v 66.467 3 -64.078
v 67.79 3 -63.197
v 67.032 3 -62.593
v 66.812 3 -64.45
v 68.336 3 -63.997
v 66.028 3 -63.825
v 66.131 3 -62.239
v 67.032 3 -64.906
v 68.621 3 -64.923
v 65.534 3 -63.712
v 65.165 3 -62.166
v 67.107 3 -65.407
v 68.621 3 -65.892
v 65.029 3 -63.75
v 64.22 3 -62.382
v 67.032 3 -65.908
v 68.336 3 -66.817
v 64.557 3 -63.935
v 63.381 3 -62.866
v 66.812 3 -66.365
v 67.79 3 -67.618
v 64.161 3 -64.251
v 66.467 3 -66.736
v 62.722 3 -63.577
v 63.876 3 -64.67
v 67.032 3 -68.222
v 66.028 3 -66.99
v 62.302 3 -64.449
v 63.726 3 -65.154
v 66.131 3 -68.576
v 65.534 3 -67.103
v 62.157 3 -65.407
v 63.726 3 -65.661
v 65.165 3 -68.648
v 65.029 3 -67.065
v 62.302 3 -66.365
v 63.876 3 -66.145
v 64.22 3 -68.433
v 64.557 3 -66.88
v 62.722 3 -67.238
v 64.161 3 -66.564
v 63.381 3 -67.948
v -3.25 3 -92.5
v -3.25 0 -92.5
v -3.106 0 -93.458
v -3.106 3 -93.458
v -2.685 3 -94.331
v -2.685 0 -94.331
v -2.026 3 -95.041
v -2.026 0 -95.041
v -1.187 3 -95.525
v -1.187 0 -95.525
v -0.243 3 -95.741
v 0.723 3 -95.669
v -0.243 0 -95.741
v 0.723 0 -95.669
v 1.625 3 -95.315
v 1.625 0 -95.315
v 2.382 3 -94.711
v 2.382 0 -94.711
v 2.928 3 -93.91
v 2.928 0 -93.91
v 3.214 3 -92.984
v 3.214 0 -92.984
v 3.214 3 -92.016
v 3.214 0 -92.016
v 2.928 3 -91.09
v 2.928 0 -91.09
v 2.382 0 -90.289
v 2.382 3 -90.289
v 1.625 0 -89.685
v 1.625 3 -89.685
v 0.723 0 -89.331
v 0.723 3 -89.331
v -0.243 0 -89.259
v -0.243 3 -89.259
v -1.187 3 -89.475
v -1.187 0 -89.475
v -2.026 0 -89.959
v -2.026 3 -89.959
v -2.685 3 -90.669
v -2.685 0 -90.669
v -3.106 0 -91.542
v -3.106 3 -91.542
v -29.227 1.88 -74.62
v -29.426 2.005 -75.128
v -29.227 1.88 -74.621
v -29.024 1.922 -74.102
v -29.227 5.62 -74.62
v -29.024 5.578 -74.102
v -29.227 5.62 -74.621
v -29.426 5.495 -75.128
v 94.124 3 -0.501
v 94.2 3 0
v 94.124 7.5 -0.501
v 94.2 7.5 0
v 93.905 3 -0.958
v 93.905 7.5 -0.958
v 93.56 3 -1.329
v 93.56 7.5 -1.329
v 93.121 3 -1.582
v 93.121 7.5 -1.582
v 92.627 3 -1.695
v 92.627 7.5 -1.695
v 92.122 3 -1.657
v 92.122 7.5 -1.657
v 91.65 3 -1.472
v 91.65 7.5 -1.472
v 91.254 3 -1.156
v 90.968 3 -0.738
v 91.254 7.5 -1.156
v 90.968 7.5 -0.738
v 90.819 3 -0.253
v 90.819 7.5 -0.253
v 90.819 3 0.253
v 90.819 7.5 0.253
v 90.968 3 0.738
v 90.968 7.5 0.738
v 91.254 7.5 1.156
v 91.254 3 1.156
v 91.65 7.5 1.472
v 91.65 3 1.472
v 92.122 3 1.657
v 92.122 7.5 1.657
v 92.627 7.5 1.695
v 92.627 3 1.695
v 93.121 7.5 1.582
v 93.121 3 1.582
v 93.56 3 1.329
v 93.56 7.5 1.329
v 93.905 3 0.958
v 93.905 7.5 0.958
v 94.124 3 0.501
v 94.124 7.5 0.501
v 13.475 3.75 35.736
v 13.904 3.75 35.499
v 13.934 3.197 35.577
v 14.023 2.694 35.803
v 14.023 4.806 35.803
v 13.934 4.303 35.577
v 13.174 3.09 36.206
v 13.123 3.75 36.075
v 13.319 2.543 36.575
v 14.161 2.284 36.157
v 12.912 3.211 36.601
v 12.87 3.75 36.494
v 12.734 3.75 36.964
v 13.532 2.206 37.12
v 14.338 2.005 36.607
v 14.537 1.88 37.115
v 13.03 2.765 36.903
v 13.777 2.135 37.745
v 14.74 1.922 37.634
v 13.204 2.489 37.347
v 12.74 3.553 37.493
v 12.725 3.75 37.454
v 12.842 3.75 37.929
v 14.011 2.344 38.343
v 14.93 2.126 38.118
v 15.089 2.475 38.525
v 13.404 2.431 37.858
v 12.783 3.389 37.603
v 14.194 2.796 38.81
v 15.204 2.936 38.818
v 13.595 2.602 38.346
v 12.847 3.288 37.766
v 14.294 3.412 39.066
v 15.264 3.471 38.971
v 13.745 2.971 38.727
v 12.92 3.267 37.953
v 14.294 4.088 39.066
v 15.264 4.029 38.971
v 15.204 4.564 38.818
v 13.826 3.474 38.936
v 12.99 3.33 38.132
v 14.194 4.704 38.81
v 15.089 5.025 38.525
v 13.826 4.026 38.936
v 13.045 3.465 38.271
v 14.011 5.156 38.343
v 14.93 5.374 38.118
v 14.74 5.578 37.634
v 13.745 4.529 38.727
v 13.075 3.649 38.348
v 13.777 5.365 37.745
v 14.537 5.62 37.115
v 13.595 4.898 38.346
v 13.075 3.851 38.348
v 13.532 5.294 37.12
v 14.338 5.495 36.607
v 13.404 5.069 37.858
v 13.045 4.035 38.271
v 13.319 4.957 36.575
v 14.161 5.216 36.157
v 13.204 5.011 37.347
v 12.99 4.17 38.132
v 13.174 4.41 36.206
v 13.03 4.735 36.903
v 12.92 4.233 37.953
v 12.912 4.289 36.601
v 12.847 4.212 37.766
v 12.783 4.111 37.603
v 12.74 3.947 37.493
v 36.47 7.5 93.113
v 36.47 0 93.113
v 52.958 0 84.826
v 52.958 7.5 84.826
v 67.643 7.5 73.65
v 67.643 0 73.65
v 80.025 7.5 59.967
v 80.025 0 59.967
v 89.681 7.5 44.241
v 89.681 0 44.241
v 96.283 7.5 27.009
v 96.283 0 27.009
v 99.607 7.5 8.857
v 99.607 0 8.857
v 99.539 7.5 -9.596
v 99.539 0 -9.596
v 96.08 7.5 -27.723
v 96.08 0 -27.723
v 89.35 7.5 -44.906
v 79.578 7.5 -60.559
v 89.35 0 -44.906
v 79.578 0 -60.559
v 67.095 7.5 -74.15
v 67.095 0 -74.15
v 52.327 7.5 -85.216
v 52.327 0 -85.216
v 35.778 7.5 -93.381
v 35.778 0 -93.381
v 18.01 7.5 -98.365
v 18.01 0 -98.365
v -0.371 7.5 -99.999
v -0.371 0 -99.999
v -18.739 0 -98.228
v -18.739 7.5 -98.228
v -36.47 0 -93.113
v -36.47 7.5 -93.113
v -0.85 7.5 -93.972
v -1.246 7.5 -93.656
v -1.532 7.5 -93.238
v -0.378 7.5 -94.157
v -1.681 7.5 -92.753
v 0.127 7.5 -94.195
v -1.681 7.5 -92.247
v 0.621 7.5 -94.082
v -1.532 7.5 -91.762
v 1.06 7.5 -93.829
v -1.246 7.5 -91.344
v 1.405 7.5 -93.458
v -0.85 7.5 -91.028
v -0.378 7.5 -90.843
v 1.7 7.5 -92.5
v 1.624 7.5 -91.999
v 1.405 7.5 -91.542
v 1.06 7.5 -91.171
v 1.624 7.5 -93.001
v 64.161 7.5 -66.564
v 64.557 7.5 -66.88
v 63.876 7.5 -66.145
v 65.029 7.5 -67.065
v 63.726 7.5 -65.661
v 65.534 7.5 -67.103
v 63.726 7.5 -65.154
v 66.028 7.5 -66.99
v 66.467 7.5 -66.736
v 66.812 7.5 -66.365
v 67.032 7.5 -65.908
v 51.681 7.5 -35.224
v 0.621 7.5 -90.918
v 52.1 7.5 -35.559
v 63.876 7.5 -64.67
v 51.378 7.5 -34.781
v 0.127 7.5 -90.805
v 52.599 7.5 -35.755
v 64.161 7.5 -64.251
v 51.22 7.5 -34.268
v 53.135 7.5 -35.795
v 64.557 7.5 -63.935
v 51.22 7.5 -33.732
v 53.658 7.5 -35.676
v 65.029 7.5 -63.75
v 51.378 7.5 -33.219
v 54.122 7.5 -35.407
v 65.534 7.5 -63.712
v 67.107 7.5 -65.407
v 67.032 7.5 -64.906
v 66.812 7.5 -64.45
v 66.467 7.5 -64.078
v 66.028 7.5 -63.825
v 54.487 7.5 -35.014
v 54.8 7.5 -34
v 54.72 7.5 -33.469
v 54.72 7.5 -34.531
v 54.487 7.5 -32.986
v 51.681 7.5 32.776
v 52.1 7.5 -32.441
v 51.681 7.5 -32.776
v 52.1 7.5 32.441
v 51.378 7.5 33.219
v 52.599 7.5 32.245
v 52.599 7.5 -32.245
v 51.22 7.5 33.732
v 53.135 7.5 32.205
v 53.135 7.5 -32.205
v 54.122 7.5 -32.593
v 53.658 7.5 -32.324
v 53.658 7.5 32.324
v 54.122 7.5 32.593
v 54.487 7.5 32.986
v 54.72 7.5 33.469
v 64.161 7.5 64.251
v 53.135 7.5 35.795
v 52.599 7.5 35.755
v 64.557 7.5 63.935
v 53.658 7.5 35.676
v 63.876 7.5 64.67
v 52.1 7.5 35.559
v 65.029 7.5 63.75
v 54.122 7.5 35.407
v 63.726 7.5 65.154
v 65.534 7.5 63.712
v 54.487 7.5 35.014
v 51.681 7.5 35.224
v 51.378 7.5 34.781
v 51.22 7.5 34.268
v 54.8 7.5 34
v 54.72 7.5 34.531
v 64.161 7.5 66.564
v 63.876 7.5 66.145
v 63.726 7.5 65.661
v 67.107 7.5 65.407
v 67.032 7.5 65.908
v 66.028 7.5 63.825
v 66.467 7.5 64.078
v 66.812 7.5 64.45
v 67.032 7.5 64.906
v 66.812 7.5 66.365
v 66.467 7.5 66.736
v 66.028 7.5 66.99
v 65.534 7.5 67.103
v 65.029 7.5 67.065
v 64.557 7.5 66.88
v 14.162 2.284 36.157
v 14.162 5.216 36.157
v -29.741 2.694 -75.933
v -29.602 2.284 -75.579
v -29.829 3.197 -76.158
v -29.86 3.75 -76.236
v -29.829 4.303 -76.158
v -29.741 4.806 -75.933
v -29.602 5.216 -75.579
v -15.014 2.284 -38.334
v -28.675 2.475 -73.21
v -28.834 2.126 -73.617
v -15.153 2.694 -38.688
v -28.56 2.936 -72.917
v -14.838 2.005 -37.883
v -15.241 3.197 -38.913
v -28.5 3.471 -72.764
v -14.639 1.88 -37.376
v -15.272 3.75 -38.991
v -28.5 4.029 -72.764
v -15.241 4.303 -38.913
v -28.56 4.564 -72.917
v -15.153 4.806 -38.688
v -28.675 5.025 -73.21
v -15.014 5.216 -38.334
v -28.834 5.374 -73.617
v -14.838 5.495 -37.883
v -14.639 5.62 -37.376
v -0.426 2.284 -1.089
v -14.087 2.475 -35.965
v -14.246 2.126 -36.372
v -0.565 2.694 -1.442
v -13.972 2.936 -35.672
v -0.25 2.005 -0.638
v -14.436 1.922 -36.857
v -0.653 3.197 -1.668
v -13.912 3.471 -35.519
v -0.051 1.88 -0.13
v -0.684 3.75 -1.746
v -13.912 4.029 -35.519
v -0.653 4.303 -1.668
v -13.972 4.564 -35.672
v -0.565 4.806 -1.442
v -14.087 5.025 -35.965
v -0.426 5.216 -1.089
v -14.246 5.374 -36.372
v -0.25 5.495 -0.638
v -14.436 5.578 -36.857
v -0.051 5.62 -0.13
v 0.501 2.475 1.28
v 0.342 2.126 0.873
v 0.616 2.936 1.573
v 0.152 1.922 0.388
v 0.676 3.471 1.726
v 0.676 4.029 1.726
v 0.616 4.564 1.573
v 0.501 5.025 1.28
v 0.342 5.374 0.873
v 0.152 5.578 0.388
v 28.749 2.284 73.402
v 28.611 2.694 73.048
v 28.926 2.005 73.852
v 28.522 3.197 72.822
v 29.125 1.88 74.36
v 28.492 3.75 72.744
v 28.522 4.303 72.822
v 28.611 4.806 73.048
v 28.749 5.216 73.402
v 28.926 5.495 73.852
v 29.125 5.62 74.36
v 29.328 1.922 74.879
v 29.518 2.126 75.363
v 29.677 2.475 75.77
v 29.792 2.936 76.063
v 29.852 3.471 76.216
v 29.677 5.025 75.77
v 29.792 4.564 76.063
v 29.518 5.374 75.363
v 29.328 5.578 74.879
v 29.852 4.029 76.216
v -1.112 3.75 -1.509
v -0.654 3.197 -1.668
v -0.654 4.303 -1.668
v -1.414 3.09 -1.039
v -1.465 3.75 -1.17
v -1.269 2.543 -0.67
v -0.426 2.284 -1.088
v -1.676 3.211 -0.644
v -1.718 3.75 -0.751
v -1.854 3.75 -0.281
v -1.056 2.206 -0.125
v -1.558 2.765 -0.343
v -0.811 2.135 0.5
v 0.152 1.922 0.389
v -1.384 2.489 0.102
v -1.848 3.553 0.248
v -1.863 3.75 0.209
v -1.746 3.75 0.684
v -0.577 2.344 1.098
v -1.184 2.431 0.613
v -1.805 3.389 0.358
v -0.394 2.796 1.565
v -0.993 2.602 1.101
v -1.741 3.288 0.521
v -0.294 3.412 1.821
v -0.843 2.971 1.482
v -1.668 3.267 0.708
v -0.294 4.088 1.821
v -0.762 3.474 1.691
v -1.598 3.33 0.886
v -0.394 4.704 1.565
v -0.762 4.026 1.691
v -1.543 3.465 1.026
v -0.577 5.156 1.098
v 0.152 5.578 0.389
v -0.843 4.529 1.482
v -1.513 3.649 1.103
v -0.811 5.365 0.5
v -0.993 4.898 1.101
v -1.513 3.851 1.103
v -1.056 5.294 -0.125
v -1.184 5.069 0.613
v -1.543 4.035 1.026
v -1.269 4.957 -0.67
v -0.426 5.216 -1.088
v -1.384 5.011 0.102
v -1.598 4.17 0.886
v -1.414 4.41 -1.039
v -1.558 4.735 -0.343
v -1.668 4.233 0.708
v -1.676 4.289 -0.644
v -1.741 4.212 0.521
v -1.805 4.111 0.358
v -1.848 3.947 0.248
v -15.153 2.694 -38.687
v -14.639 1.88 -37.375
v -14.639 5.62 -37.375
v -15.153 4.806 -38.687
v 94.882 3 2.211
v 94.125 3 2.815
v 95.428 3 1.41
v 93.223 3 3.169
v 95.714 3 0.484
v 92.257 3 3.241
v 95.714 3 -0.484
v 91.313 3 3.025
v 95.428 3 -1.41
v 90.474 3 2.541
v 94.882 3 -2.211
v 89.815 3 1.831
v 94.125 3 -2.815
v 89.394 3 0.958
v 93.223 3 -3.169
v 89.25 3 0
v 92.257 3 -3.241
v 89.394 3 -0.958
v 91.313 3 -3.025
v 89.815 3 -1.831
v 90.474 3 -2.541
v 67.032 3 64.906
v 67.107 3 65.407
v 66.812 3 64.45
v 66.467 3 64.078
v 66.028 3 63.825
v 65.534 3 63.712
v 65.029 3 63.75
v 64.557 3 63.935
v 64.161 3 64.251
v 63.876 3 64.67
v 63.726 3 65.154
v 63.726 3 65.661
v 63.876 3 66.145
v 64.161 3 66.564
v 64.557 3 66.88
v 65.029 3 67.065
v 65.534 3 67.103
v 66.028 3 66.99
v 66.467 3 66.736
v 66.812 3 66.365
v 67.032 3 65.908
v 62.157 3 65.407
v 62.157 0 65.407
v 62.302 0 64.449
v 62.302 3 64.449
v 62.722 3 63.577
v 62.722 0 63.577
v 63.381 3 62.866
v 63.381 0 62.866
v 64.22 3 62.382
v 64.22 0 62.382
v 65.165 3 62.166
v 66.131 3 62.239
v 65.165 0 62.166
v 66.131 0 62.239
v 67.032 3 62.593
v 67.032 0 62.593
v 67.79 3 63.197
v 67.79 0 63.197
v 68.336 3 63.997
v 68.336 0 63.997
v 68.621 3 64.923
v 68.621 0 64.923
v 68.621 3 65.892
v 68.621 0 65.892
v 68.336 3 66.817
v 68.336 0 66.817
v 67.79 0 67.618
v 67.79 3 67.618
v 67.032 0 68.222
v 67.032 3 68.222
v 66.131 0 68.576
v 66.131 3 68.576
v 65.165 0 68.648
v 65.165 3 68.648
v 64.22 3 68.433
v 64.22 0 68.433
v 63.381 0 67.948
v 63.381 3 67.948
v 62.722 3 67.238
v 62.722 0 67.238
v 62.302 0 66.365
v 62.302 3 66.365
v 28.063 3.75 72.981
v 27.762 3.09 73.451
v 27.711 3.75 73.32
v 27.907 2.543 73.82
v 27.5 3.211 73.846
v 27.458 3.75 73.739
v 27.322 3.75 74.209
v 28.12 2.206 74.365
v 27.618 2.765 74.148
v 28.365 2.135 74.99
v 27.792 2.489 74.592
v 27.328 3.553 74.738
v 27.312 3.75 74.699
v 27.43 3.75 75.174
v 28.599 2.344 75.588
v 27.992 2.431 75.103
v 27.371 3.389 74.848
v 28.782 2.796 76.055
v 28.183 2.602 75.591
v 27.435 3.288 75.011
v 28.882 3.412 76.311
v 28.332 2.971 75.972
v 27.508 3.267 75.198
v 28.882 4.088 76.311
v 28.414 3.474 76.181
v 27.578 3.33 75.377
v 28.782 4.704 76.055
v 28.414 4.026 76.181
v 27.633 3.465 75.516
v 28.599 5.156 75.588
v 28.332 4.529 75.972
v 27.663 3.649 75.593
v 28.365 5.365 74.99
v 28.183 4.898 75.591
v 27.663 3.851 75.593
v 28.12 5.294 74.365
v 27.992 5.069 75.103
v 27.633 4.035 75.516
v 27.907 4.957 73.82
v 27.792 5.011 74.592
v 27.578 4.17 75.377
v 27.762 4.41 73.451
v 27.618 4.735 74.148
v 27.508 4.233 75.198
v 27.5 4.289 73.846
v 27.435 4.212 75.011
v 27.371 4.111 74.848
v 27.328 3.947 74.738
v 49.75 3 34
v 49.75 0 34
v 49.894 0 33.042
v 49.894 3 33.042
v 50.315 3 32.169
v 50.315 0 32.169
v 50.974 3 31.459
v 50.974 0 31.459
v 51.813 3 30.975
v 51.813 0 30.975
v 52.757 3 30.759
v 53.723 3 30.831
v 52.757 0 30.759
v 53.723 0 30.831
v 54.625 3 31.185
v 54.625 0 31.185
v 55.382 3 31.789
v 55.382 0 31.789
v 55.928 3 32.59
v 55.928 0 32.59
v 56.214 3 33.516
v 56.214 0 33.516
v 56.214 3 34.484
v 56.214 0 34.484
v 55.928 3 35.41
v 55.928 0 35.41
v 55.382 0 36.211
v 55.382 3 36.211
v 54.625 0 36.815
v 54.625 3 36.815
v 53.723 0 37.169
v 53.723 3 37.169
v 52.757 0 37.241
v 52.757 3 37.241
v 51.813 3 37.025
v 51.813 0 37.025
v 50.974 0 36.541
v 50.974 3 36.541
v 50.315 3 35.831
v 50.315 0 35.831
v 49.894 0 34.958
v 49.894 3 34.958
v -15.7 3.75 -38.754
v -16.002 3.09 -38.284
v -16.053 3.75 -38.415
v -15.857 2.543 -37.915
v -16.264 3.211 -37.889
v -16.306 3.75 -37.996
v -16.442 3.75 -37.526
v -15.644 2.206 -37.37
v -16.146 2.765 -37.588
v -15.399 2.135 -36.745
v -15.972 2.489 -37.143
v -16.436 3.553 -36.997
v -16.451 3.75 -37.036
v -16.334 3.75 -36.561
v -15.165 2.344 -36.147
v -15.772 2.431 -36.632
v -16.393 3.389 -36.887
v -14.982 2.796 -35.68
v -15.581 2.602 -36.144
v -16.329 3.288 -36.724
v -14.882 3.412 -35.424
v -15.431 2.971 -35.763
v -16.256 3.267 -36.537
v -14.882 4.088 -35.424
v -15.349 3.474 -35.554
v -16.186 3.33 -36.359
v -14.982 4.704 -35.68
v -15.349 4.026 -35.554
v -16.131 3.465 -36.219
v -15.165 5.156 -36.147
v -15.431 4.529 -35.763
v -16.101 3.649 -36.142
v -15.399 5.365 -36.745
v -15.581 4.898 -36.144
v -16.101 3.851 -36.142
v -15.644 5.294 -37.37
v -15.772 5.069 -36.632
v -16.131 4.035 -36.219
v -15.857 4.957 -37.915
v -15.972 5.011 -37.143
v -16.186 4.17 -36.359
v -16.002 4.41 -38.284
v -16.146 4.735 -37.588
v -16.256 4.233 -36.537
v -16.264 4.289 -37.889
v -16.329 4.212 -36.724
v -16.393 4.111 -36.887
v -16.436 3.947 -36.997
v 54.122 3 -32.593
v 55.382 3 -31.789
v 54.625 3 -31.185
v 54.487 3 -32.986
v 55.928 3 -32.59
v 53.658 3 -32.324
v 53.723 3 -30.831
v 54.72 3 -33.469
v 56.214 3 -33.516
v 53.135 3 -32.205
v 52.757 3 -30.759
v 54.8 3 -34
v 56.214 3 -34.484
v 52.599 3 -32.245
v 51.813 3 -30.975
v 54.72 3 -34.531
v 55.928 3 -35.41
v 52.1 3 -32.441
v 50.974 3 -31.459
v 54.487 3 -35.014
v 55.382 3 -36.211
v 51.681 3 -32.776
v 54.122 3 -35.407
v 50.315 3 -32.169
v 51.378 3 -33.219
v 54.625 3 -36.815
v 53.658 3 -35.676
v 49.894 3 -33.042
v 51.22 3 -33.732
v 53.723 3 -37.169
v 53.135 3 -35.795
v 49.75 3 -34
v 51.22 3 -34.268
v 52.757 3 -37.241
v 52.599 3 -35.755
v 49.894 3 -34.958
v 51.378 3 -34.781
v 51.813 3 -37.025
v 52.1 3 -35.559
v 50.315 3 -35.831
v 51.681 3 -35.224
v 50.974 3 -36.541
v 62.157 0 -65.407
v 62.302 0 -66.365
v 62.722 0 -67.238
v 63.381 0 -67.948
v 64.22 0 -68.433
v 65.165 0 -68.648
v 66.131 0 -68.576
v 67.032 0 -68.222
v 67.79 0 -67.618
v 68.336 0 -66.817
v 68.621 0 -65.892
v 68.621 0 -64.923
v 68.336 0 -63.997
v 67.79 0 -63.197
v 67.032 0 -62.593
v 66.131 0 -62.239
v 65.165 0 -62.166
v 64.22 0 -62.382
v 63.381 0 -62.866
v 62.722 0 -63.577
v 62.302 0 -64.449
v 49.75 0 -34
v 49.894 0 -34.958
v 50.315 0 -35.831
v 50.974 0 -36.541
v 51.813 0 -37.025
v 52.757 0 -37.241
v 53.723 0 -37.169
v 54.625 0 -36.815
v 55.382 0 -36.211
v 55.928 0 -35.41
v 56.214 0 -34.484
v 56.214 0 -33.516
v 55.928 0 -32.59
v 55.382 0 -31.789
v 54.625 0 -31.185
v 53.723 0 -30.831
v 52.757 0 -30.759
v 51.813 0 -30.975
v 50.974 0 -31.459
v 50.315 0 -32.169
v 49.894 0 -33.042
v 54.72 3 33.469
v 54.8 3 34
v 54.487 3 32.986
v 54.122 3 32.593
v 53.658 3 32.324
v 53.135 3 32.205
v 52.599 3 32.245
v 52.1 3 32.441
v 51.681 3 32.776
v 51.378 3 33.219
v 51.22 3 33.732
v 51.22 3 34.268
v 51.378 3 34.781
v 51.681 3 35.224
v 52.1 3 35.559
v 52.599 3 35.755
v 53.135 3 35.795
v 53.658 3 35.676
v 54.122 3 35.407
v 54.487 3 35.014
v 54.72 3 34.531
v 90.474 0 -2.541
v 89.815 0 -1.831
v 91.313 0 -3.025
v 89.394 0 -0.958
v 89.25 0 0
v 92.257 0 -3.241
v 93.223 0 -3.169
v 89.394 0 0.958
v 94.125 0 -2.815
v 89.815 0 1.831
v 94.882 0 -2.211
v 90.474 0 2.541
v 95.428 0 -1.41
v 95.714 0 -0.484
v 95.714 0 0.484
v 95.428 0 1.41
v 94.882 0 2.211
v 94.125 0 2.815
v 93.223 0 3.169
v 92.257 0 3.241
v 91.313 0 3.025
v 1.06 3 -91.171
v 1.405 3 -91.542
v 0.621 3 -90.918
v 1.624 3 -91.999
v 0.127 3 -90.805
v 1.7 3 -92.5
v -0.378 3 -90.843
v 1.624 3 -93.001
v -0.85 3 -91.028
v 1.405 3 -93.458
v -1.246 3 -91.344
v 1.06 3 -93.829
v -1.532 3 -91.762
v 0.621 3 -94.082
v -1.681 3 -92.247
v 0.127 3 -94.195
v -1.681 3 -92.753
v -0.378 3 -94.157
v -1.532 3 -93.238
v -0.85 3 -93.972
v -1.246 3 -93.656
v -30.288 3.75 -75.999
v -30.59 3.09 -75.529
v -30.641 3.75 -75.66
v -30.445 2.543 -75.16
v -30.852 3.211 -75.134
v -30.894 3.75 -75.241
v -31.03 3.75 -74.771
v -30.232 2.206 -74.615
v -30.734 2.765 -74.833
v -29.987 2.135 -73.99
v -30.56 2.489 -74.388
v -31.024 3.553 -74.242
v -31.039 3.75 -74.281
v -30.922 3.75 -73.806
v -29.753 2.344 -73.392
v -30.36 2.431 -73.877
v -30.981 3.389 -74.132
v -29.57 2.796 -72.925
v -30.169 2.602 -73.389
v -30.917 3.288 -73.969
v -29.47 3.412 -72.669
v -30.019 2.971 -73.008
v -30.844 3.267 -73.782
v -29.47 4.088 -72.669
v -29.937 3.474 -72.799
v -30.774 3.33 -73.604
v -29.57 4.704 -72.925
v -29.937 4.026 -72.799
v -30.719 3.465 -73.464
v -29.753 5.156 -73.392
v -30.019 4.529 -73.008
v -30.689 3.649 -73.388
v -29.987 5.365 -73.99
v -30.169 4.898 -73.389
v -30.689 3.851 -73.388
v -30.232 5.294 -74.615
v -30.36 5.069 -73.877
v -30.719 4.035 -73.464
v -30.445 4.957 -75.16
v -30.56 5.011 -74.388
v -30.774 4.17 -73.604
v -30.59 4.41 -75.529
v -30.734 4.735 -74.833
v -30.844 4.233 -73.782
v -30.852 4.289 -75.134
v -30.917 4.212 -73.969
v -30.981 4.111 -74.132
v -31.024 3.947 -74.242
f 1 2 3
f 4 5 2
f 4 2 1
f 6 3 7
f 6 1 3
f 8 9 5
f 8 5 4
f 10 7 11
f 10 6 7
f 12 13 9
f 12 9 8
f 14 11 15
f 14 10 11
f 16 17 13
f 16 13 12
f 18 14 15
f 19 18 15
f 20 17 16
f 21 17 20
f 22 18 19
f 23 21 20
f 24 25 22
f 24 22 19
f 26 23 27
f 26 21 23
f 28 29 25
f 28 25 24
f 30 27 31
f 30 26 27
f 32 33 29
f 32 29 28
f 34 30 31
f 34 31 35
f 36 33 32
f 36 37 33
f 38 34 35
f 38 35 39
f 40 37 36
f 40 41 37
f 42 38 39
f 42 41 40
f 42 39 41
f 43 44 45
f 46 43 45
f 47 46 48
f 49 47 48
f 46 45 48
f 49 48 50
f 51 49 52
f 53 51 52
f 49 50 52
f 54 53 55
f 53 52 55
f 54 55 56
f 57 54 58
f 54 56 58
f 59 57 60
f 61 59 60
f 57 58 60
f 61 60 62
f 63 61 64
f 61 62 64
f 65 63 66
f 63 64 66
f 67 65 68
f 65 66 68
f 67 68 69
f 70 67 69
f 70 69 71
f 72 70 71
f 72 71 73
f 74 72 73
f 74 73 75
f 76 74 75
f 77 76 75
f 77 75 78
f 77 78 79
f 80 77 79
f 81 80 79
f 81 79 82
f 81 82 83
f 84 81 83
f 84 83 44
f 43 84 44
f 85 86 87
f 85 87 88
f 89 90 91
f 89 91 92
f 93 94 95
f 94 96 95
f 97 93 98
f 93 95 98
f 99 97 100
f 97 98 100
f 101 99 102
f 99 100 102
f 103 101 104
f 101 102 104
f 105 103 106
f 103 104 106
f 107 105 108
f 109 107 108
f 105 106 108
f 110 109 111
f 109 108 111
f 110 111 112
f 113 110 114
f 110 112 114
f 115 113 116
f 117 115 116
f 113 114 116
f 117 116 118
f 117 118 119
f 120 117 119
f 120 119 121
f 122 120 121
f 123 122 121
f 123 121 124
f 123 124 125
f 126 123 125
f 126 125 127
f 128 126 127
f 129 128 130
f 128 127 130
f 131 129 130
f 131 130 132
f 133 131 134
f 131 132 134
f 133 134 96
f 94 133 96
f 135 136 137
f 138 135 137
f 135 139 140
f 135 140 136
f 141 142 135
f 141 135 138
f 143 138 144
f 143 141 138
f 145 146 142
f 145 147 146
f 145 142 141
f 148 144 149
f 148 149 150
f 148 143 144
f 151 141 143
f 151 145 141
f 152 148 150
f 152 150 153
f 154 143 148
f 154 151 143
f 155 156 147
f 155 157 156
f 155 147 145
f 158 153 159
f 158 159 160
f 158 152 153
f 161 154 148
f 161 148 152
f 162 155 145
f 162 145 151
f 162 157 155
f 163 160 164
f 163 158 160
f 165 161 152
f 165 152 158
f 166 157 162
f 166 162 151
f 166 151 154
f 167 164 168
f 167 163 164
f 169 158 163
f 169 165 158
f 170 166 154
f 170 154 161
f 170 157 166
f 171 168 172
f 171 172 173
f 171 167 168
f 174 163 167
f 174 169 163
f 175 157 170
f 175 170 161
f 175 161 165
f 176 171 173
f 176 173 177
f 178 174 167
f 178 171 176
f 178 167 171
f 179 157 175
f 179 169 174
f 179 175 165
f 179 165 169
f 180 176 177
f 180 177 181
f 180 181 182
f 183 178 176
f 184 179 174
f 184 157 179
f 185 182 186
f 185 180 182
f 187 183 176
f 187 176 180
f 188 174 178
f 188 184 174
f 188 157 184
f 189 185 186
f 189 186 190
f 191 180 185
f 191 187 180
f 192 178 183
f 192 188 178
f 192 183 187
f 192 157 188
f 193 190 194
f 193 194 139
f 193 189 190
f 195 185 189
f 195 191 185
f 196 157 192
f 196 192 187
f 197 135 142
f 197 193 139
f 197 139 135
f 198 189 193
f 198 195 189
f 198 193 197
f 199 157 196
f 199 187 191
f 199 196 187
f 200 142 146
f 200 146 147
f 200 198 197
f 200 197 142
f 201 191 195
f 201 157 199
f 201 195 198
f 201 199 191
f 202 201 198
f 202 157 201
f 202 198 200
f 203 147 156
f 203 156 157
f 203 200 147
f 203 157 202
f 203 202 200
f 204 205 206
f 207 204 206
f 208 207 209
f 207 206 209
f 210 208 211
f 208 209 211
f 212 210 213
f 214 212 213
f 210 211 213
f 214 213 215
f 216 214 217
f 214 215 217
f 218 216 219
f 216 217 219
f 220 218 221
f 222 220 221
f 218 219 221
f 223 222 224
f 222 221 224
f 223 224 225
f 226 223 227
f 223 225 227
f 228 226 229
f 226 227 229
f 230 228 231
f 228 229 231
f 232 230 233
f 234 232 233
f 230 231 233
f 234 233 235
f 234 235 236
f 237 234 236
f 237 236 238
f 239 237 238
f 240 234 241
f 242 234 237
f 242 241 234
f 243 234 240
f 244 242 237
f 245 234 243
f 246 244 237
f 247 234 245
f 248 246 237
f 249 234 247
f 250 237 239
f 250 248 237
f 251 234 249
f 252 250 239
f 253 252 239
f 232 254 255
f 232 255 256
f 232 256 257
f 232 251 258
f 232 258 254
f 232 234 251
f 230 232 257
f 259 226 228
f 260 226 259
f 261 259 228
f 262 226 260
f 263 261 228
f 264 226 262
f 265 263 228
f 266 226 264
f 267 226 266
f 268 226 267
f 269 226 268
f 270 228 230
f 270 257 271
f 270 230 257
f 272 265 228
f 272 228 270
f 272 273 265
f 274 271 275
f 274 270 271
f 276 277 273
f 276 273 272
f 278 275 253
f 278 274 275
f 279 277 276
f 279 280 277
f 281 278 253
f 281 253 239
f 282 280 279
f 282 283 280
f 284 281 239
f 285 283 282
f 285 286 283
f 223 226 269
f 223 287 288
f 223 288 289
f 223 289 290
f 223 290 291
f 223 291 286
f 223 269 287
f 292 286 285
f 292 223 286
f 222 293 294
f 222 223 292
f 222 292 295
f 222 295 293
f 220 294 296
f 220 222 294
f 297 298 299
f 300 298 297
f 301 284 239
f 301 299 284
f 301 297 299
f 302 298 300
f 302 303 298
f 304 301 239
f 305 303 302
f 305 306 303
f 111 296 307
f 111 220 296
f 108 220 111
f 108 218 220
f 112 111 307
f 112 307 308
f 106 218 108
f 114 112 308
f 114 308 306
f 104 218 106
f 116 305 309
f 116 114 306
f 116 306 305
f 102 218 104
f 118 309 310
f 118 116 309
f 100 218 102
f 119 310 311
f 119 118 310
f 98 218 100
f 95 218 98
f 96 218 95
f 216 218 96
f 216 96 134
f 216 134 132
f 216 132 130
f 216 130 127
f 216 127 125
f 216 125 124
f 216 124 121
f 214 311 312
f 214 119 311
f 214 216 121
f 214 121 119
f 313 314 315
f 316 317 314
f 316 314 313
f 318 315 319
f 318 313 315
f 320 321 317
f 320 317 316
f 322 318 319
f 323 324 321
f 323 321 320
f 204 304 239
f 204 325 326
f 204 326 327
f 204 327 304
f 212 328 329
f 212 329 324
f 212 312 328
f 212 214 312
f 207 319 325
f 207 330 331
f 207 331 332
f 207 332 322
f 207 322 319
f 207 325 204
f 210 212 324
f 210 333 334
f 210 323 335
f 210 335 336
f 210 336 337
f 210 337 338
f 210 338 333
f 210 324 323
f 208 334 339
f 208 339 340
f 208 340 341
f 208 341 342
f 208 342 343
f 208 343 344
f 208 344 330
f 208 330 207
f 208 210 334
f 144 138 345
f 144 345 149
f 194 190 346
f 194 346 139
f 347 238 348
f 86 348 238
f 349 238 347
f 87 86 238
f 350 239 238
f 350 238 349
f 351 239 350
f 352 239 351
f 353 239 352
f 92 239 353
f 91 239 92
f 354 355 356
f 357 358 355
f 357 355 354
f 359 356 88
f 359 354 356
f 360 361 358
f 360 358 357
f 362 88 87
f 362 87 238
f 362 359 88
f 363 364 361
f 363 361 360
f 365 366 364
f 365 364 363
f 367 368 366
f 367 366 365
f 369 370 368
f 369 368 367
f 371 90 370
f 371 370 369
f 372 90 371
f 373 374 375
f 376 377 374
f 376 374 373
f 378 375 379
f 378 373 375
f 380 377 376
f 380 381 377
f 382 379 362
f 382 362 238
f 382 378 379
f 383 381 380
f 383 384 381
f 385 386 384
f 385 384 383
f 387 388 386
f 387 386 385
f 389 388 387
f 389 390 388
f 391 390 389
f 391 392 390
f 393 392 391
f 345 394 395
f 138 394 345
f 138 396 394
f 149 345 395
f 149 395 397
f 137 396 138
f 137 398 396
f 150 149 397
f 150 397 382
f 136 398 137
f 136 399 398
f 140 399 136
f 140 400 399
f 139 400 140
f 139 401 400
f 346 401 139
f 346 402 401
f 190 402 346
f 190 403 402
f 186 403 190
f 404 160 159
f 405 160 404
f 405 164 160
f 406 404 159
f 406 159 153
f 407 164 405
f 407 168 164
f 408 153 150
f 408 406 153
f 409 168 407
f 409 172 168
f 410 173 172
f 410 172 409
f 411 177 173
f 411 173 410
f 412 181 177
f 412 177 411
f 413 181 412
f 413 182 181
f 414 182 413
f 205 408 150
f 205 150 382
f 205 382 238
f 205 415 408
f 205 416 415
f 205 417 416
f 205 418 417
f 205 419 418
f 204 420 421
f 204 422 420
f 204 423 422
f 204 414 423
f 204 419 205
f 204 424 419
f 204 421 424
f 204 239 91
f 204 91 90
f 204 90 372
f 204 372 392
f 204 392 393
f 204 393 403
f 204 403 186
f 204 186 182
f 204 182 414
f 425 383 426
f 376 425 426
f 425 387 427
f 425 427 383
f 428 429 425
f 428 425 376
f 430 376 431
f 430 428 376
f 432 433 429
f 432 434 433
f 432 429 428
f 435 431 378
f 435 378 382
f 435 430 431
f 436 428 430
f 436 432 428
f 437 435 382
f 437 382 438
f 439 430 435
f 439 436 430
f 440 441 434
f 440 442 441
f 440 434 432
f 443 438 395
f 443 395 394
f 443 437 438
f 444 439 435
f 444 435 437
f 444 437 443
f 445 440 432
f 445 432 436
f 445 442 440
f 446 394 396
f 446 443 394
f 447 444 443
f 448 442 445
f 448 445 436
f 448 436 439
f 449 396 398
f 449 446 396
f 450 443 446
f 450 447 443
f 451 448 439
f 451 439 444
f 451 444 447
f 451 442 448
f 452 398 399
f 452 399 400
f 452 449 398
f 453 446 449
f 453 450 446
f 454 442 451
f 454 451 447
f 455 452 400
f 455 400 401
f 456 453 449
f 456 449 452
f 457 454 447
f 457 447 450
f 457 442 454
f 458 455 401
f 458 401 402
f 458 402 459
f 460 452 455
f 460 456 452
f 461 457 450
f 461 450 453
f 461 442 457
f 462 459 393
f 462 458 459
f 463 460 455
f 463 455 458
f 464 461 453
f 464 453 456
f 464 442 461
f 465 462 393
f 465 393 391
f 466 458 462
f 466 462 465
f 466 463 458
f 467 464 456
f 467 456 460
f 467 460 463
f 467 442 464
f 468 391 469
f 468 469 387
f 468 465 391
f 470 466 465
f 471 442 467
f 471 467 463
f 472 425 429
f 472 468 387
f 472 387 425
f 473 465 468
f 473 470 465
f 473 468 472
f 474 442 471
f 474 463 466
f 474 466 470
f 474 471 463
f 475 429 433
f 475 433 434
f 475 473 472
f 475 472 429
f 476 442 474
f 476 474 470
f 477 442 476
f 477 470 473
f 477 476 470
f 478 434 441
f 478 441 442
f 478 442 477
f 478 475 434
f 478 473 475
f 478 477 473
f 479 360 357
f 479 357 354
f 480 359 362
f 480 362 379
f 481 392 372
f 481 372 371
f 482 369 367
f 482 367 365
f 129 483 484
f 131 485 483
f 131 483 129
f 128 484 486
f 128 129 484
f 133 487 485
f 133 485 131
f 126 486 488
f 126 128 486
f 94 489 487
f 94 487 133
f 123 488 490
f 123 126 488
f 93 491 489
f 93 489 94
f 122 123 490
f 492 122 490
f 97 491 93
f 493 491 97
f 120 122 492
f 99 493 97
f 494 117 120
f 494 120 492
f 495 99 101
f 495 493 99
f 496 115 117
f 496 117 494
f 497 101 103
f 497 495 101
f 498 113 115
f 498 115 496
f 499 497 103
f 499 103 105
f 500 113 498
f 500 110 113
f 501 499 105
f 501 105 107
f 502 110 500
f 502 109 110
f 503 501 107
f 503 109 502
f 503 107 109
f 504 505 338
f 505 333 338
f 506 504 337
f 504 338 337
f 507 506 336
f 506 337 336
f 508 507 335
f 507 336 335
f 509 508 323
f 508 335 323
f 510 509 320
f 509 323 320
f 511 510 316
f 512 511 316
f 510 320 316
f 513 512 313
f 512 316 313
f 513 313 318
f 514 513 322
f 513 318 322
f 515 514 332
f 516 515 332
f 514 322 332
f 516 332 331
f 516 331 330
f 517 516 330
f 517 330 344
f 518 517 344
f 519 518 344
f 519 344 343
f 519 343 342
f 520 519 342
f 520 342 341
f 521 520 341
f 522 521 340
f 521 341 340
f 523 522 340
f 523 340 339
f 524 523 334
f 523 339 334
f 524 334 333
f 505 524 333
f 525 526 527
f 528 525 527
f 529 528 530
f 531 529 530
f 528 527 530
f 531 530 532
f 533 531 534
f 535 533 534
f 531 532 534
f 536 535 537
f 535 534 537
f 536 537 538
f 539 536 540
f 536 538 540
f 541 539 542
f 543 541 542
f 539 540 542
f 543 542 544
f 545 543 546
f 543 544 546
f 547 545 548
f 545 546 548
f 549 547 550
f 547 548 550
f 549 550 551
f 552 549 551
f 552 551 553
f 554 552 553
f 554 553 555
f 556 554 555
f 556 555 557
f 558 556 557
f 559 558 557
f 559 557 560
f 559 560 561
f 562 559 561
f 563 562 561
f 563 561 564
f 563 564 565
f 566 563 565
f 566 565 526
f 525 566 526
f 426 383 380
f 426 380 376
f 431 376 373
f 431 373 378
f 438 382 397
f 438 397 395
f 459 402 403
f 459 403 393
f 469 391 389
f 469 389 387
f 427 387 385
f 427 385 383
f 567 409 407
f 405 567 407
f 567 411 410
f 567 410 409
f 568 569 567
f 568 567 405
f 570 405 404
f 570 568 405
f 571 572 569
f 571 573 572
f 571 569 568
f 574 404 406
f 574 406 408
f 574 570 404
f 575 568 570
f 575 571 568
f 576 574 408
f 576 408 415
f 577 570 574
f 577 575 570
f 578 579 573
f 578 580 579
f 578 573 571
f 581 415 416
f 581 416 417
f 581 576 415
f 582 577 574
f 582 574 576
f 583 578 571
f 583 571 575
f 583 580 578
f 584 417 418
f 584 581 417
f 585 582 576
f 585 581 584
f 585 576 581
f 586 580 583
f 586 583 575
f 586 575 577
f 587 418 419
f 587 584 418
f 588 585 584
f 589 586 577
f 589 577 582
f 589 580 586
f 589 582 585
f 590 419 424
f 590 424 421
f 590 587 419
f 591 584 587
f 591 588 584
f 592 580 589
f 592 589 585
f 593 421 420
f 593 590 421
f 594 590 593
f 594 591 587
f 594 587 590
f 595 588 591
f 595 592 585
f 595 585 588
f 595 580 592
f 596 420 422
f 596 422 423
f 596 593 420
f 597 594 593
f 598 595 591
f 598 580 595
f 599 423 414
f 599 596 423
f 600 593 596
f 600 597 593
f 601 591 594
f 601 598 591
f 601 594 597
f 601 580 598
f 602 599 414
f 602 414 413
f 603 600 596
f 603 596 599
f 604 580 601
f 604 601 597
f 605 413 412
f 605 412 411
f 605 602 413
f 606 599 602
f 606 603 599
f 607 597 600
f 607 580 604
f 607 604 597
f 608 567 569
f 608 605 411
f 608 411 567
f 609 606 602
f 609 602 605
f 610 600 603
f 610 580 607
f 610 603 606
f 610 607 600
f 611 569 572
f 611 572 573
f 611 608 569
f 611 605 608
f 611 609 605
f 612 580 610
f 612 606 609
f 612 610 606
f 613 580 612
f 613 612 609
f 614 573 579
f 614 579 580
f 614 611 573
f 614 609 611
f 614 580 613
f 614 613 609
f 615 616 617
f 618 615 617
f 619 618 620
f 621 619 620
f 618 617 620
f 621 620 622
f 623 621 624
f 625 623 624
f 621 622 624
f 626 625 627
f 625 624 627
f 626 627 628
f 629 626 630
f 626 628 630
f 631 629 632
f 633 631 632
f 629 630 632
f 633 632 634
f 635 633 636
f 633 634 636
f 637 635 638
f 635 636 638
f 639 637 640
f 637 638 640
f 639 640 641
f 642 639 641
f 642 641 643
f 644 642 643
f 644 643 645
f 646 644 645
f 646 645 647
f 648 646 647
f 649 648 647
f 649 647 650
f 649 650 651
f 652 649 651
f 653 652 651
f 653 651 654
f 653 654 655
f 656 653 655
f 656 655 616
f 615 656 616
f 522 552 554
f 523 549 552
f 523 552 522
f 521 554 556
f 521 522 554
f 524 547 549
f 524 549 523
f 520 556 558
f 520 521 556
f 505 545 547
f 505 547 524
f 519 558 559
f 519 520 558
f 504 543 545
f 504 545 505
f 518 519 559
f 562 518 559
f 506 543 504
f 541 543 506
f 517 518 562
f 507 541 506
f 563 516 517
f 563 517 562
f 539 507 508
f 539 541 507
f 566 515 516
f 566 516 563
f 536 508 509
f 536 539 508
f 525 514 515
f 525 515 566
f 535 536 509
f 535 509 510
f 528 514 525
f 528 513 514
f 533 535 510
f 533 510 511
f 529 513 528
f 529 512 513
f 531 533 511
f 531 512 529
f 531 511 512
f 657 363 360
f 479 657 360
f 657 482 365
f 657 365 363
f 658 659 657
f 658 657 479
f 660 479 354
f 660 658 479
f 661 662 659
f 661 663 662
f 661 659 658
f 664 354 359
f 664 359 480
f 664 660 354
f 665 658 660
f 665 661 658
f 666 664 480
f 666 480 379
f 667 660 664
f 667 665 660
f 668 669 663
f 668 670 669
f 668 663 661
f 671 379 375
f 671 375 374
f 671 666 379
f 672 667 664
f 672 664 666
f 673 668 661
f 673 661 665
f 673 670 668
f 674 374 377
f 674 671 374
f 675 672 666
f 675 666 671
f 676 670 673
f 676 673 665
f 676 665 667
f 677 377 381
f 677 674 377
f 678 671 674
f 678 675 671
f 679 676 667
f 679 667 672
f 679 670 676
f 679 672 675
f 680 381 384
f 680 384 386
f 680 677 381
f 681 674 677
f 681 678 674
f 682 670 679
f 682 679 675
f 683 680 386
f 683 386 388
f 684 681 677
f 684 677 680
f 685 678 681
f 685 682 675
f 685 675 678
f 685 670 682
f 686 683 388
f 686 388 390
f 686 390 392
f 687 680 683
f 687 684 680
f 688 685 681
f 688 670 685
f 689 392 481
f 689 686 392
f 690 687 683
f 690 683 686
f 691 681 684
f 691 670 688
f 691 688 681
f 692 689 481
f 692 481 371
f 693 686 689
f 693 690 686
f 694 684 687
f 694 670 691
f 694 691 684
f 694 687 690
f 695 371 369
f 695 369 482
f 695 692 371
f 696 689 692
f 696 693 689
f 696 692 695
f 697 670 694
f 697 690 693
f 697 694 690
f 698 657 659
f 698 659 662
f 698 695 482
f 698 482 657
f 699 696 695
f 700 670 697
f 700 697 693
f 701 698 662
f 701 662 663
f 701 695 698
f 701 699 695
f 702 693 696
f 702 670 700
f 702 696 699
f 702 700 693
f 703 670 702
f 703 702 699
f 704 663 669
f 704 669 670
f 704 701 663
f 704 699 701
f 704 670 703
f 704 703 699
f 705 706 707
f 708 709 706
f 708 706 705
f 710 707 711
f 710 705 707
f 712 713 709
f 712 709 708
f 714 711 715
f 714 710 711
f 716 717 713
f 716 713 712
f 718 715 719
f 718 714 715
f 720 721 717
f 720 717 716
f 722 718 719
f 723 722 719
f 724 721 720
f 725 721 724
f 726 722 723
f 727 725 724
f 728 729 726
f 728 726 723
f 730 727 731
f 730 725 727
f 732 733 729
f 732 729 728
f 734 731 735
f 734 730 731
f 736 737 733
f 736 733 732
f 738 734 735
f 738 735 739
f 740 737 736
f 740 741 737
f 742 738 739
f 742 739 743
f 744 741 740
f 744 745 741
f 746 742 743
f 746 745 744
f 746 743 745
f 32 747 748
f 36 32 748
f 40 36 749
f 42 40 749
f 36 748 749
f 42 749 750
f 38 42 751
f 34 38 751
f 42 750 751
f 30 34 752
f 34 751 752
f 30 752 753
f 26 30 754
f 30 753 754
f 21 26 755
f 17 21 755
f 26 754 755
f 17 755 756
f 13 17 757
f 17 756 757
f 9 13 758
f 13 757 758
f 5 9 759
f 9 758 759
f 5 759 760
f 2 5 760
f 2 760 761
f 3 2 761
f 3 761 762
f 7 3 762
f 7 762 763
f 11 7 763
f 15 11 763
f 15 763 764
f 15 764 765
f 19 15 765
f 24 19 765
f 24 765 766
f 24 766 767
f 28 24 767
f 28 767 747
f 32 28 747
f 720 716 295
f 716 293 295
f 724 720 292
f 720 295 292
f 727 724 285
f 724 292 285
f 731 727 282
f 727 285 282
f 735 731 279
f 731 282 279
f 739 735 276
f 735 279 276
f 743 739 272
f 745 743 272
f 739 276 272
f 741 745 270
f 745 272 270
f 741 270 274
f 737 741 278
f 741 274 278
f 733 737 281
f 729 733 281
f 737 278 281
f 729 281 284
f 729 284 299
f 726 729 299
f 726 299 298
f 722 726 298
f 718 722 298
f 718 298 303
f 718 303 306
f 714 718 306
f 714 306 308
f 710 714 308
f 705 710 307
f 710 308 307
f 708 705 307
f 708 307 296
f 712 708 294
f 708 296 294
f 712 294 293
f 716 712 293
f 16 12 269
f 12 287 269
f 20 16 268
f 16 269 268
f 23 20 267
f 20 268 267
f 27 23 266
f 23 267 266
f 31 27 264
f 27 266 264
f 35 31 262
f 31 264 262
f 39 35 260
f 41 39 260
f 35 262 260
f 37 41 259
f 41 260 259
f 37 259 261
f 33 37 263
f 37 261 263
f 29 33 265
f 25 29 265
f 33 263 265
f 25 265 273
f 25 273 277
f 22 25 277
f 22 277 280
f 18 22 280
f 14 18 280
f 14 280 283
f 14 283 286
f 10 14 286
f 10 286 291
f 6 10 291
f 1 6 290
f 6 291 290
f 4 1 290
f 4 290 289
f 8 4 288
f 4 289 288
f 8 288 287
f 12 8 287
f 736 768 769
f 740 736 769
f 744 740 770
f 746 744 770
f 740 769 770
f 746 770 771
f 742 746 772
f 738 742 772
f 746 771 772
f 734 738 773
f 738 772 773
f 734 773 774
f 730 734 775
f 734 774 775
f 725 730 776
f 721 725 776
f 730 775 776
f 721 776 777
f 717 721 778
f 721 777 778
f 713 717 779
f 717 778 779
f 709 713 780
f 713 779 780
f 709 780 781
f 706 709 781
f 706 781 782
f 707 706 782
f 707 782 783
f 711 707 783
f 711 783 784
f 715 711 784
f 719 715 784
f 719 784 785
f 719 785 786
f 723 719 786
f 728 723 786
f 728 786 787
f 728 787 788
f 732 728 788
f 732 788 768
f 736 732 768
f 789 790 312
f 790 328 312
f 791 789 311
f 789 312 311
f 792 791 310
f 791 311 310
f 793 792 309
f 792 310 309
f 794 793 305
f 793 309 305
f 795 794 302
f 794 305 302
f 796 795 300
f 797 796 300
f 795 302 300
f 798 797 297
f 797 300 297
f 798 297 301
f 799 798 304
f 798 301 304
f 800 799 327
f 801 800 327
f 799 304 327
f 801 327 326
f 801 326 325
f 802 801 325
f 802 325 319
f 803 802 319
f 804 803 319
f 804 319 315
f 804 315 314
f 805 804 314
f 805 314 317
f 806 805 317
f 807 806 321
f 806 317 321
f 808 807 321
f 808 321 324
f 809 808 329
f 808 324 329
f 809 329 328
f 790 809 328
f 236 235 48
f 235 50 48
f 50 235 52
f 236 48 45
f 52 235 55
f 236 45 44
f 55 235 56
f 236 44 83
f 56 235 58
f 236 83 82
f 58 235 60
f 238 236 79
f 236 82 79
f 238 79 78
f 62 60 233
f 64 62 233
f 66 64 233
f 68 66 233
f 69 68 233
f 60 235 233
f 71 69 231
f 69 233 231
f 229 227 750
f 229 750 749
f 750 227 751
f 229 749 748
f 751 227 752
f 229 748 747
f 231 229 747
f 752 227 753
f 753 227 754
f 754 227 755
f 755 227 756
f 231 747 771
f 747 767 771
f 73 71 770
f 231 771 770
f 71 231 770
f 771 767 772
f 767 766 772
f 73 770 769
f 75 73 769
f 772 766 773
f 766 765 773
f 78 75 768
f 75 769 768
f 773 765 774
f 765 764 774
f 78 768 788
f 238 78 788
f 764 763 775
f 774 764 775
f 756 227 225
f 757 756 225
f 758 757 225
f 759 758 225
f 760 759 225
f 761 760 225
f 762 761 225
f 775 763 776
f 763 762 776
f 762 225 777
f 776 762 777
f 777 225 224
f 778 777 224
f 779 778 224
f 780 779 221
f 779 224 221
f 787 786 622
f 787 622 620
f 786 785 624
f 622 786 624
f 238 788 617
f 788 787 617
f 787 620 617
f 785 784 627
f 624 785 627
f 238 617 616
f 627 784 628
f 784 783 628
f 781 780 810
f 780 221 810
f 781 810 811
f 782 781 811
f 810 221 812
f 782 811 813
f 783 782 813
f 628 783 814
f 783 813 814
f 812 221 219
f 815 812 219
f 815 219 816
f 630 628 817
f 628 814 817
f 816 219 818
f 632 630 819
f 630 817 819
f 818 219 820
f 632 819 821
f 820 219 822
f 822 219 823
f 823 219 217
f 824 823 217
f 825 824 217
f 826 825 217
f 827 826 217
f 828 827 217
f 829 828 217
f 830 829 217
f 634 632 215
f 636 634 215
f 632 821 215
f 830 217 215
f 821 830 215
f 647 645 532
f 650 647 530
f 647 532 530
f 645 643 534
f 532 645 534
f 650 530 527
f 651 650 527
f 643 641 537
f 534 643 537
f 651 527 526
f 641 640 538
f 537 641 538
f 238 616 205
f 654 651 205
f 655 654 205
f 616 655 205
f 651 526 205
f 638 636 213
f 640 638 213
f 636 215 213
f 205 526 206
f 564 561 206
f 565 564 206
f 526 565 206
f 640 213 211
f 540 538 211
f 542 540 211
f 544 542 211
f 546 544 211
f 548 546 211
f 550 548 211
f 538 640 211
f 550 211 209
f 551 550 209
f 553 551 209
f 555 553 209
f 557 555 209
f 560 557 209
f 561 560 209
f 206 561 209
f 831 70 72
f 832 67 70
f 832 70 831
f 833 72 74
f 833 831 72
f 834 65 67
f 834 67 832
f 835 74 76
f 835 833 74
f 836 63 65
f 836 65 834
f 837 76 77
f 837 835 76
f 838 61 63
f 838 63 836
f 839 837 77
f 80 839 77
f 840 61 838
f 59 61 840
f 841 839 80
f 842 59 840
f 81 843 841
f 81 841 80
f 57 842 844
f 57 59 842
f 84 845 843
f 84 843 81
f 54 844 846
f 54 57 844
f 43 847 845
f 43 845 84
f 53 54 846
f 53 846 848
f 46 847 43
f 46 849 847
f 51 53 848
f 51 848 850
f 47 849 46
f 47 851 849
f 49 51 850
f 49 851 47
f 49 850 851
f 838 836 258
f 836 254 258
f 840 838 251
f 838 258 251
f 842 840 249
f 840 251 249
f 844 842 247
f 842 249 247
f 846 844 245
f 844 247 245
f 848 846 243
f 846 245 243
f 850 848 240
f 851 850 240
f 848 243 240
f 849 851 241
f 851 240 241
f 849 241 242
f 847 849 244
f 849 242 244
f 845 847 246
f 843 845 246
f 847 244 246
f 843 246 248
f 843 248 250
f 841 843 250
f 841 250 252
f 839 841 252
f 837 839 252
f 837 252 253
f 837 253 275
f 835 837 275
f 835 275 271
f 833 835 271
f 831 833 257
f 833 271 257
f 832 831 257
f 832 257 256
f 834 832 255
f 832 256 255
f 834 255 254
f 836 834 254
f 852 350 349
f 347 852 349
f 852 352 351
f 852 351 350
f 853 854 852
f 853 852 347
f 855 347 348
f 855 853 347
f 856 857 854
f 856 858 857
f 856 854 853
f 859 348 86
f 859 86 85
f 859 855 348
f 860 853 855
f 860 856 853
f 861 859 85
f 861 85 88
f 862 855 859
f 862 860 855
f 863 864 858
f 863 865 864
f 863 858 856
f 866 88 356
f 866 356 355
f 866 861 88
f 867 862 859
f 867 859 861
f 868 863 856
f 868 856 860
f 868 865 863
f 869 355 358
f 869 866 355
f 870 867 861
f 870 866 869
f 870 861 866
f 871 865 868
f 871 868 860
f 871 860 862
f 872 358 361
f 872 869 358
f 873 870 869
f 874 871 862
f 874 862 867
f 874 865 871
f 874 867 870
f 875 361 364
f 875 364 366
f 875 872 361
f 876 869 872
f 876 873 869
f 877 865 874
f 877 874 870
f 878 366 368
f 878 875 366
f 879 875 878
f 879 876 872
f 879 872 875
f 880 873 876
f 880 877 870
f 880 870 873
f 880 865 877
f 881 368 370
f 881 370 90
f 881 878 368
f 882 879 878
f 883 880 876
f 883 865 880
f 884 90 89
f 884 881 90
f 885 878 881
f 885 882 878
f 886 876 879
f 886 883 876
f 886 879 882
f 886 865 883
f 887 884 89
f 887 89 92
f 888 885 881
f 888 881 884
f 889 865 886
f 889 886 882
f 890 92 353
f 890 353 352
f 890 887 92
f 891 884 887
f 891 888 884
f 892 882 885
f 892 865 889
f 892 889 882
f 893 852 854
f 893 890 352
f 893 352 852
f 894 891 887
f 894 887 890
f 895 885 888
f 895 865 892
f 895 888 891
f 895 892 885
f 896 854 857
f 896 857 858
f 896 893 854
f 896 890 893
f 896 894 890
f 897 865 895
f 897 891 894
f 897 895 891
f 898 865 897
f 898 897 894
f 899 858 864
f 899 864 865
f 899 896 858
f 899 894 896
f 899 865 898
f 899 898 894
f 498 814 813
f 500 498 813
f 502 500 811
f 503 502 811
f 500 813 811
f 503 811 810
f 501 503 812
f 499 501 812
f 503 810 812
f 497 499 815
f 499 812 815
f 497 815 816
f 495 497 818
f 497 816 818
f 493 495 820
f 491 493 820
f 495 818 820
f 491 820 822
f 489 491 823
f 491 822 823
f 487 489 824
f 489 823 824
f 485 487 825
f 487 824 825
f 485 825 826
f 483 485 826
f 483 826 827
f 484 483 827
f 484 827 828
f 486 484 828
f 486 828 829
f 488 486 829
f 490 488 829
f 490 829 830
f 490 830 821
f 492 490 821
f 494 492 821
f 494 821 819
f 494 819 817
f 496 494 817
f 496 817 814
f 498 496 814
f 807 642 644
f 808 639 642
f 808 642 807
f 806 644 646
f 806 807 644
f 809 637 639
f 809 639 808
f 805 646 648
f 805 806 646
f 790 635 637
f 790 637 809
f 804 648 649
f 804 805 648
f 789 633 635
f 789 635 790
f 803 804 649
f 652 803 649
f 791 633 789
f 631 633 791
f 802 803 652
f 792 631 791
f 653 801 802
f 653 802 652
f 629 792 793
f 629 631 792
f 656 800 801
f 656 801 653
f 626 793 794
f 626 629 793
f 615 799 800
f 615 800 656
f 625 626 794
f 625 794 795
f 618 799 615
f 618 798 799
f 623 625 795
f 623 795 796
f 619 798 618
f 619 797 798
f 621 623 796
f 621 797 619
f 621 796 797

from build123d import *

# Parameters (mm, degrees)
SKETCH1_R                      = 100
BOSS_EXTRUDE1_DEPTH            = 7.5
CBORE_FOR_M3_SHCS1_D           = 3.4
CBORE_FOR_M3_SHCS1_DEPTH       = 7.5
CBORE_FOR_M3_SHCS1_CBORE_D     = 6.5
CBORE_FOR_M3_SHCS1_CBORE_DEPTH = 3
CBORE_FOR_M3_SHCS1_TIP         = 1.021463052
CBORE_FOR_M3_SHCS2_D           = 3.6
CBORE_FOR_M3_SHCS2_DEPTH       = 7.5
CBORE_FOR_M3_SHCS2_CBORE_D     = 6.5
CBORE_FOR_M3_SHCS2_CBORE_DEPTH = 3
CBORE_FOR_M3_SHCS2_TIP         = 1.081549114
SKETCH9_W                      = 276.839915284
SKETCH9_H                      = 86.454597136
CUT_EXTRUDE1_DEPTH             = 142.620090383
SKETCH11_R                     = 1.875
BOSS_EXTRUDE3_DEPTH            = 1.875
FILLET1_R                      = 1.875


with BuildPart() as part:
    # Sketch1 → Boss-Extrude1 (new body)
    with BuildSketch(Plane(origin=(0, 0, 0), x_dir=(1, 0, 0), z_dir=(0, 1, 0))):
        with Locations(Location((0, 0, 0), (0, 0, 270))):
            Circle(SKETCH1_R)
    extrude(amount=BOSS_EXTRUDE1_DEPTH)

    # CBORE for M3 SHCS1
    with Locations(Plane(origin=(0, 0, 0), x_dir=(-1, 0, 0), z_dir=(0, -1, 0))):
        with Locations((0, -92.5), (-65.40737726, -65.40737726), (-92.5, 0), (-65.40737726, 65.40737726), (0, 92.5), (65.40737726, 65.40737726), (92.5, 0), (65.40737726, -65.40737726)):
            CounterBoreHole(CBORE_FOR_M3_SHCS1_D / 2, CBORE_FOR_M3_SHCS1_CBORE_D / 2, CBORE_FOR_M3_SHCS1_CBORE_DEPTH, depth=CBORE_FOR_M3_SHCS1_DEPTH)
            with Locations((0, 0, -(CBORE_FOR_M3_SHCS1_DEPTH + CBORE_FOR_M3_SHCS1_TIP / 2))):  # 118° drill point
                Cone(0, CBORE_FOR_M3_SHCS1_D / 2, CBORE_FOR_M3_SHCS1_TIP, mode=Mode.SUBTRACT)

    # CBORE for M3 SHCS2
    with Locations(Plane(origin=(0, 0, 0), x_dir=(-1, 0, 0), z_dir=(0, -1, 0))):
        with Locations((-53, 34), (53, 34), (53, -34), (-53, -34)):
            CounterBoreHole(CBORE_FOR_M3_SHCS2_D / 2, CBORE_FOR_M3_SHCS2_CBORE_D / 2, CBORE_FOR_M3_SHCS2_CBORE_DEPTH, depth=CBORE_FOR_M3_SHCS2_DEPTH)
            with Locations((0, 0, -(CBORE_FOR_M3_SHCS2_DEPTH + CBORE_FOR_M3_SHCS2_TIP / 2))):  # 118° drill point
                Cone(0, CBORE_FOR_M3_SHCS2_D / 2, CBORE_FOR_M3_SHCS2_TIP, mode=Mode.SUBTRACT)

    # Sketch9 → Cut-Extrude1 (cut, through all)
    with BuildSketch(Plane(origin=(0, 0, 0), x_dir=(0.3646980843717534, 0, 0.9311258278318637), z_dir=(-0.9311258278318637, 0, 0.3646980843717534))):
        with Locations((-1.022117504, -7.168579764)):
            Rectangle(SKETCH9_W, SKETCH9_H)
    extrude(amount=CUT_EXTRUDE1_DEPTH, mode=Mode.SUBTRACT)

    # Sketch11 → Boss-Extrude3 (add)
    with BuildSketch(Plane(origin=(0, 0, 0), x_dir=(0.3646980843717534, 0, 0.9311258278318637), z_dir=(-0.9311258278318637, 0, 0.3646980843717534))):
        with Locations(Location((0, 3.75, 0), (0, 0, 180))):
            Circle(SKETCH11_R)
        with Locations(Location((-40, 3.75, 0), (0, 0, 180))):
            Circle(SKETCH11_R)
        with Locations(Location((-80, 3.75, 0), (0, 0, 180))):
            Circle(SKETCH11_R)
        with Locations(Location((80, 3.75, 0), (0, 0, 180))):
            Circle(SKETCH11_R)
        with Locations(Location((40, 3.75, 0), (0, 0, 180))):
            Circle(SKETCH11_R)
    extrude(amount=BOSS_EXTRUDE3_DEPTH)

    # Fillet1
    fillet1_edges = [part.edges().sort_by_distance(p)[0] for p in [
        (-1.062052019, 3.75, 2.429669835),
        (-15.649975394, 3.75, -34.815363278),
        (-30.237898769, 3.75, -72.060396391),
        (28.113794731, 3.75, 76.919736062),
        (13.525871356, 3.75, 39.674702949),
    ]]
    fillet(fillet1_edges, radius=FILLET1_R - 0.0001)  # a hair under: the kernel refuses the full size


solid = part.part
